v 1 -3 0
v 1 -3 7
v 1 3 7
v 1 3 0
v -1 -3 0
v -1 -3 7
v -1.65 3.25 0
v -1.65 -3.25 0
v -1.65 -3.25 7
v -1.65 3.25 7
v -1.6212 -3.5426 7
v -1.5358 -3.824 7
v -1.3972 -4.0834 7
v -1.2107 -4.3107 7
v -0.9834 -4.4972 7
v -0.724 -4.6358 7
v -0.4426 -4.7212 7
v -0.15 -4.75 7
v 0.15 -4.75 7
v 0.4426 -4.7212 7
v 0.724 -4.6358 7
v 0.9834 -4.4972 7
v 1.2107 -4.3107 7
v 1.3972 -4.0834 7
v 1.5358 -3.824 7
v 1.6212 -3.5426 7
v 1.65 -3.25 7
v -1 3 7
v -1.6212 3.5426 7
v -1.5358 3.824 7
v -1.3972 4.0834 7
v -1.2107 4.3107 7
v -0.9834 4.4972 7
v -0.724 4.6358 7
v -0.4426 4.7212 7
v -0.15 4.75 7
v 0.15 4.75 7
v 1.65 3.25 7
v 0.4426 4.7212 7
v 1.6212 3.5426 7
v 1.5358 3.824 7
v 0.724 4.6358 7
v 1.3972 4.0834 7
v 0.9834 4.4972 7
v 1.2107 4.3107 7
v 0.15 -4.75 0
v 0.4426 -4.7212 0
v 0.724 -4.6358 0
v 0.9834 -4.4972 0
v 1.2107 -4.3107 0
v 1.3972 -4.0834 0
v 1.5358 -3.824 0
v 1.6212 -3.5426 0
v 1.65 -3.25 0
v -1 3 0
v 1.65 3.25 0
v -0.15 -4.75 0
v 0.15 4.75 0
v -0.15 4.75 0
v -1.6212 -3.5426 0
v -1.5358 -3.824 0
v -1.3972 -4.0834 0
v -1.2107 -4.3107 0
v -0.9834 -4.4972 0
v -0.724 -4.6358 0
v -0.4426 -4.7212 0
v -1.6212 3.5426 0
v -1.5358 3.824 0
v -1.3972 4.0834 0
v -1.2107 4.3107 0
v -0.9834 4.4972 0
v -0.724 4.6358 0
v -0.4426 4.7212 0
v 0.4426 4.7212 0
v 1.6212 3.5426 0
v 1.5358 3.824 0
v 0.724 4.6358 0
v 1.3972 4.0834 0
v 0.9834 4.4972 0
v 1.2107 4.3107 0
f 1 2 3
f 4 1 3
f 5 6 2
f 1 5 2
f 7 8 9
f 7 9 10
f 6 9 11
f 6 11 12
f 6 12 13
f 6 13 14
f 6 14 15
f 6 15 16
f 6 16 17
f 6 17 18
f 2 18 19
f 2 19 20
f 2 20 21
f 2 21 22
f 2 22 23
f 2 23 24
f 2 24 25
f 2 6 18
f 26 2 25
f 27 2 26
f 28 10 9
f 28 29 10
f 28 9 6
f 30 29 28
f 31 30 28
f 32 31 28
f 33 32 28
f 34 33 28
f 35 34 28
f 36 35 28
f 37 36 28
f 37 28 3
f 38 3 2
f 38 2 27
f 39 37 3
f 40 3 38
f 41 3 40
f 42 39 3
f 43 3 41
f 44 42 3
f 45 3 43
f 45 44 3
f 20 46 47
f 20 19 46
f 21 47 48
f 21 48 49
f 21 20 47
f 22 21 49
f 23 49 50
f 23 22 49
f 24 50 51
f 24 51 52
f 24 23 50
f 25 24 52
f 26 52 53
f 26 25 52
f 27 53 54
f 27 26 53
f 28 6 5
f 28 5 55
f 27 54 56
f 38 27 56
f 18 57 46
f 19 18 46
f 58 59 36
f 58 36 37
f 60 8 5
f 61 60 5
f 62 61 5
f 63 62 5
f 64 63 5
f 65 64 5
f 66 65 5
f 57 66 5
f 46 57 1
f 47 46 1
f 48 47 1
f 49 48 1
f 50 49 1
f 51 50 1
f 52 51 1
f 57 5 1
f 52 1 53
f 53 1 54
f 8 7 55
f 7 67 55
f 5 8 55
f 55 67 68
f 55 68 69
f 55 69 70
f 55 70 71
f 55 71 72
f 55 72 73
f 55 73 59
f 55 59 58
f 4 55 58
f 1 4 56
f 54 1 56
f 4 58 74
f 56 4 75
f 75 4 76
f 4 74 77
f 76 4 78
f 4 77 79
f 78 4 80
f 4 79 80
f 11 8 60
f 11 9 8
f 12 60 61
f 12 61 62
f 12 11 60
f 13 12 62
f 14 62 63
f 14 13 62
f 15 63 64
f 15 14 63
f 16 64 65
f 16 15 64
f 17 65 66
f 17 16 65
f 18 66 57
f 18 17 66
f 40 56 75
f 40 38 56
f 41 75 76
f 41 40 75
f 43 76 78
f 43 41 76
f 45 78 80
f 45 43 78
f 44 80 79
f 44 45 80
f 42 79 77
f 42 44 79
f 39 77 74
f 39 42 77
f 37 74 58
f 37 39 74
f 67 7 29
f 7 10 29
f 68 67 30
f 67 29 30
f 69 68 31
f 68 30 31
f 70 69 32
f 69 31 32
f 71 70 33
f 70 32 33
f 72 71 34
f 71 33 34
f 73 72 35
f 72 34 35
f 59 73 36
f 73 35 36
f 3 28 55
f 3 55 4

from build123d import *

# Parameters (mm, degrees)
SKETCH1_W           = 3.3
SKETCH1_H           = 9.5
BOSS_EXTRUDE1_DEPTH = 7
FILLET1_R           = 1.5
SKETCH2_W           = 2
SKETCH2_H           = 6
CUT_EXTRUDE1_DEPTH  = 7


with BuildPart() as part:
    # Sketch1 → Boss-Extrude1 (new body)
    with BuildSketch(Plane.XY):
        Rectangle(SKETCH1_W, SKETCH1_H)
    extrude(amount=BOSS_EXTRUDE1_DEPTH)

    # Fillet1
    fillet1_edges = [part.edges().sort_by_distance(p)[0] for p in [
        (1.65, -4.75, 3.5),
        (-1.65, -4.75, 3.5),
        (-1.65, 4.75, 3.5),
        (1.65, 4.75, 3.5),
    ]]
    fillet(fillet1_edges, radius=FILLET1_R)

    # Sketch2 → Cut-Extrude1 (cut)
    with BuildSketch(Plane.XY.offset(7)):
        Rectangle(SKETCH2_W, SKETCH2_H)
    extrude(amount=-CUT_EXTRUDE1_DEPTH, mode=Mode.SUBTRACT)


solid = part.part
